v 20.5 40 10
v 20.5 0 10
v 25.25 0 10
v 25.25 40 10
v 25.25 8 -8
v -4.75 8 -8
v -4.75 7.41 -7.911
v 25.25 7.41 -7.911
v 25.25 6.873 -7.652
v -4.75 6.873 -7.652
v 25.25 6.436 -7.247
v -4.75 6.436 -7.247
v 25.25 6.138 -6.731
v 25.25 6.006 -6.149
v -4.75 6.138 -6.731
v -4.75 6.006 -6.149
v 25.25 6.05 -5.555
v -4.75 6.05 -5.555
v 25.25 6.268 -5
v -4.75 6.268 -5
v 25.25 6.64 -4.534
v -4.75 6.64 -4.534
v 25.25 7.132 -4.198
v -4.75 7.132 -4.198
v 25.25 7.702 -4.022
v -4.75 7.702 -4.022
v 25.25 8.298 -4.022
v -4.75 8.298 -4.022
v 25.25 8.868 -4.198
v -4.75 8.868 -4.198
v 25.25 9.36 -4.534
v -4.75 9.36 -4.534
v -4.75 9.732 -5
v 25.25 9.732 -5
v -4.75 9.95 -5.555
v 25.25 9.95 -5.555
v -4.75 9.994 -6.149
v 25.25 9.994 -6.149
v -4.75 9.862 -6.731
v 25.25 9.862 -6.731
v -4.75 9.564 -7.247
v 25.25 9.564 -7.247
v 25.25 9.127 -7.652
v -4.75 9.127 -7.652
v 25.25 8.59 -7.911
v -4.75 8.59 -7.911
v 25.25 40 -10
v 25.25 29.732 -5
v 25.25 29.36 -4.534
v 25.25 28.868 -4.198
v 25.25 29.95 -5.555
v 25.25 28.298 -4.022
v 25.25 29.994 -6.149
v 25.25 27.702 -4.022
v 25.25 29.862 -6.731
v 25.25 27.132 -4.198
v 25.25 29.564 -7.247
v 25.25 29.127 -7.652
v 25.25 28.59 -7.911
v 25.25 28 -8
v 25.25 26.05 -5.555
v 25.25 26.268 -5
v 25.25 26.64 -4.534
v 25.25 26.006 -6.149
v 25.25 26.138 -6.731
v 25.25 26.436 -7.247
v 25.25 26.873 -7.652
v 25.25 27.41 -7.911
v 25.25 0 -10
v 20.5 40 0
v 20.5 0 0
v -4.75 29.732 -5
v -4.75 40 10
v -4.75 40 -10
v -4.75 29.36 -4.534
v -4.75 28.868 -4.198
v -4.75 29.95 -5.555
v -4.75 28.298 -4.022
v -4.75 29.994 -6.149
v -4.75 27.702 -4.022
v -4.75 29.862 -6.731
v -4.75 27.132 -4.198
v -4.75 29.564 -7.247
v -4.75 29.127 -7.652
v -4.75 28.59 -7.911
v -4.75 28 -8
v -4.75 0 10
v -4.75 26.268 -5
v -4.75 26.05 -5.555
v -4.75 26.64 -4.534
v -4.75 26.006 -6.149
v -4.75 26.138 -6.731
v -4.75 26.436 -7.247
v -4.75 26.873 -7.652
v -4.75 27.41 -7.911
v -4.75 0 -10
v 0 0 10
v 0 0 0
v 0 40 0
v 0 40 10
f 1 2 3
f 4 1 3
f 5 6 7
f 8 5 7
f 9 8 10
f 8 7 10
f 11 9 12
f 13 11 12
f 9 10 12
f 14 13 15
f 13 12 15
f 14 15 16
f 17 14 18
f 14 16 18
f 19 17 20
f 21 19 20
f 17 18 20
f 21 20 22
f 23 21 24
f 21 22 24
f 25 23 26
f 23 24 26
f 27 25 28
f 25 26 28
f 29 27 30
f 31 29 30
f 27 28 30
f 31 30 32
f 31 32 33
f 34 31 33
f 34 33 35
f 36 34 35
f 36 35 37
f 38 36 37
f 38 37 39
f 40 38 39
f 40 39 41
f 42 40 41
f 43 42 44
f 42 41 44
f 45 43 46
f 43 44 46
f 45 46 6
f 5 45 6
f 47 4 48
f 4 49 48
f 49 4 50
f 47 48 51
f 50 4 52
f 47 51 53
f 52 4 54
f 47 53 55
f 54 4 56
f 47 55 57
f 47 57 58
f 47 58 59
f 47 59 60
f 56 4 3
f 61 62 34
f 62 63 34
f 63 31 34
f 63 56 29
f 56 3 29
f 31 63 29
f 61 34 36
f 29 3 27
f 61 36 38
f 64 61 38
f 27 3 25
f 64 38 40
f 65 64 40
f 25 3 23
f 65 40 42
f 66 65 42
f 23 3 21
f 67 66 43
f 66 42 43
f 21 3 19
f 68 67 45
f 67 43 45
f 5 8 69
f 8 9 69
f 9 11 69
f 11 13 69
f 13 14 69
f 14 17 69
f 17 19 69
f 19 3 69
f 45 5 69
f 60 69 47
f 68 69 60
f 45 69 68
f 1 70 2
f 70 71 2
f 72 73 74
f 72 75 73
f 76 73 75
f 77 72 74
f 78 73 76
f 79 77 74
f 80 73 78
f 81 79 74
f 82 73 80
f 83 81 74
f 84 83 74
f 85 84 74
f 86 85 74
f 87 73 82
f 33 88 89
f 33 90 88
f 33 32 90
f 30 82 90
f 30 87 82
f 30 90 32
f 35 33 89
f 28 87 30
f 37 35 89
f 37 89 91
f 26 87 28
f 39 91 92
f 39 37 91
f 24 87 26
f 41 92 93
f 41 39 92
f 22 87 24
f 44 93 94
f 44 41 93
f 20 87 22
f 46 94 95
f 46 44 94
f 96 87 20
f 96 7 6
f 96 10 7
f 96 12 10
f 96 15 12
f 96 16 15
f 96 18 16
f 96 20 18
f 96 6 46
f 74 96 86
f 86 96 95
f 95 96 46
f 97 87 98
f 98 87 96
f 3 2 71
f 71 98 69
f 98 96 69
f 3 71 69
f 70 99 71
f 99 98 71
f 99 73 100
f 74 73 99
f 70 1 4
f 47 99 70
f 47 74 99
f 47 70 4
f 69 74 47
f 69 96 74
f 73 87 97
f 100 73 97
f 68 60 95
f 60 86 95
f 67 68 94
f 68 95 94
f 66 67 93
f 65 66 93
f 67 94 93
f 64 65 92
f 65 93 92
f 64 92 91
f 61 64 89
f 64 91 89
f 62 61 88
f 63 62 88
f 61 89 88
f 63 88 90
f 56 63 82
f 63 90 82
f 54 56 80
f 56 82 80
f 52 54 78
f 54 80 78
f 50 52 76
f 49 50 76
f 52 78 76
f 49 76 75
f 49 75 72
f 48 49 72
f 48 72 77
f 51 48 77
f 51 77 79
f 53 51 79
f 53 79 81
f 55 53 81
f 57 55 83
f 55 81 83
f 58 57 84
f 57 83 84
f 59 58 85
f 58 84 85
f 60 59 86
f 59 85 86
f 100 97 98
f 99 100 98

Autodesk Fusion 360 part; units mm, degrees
sketch "Sketch1" plane through (0, 0, 0) normal (0, 1, 0) x (1, 0, 0)
  line L0 (0, 0) -> (20.5, 0)
  line L1 (20.5, 0) -> (20.5, -10)
  line L2 (20.5, -10) -> (0, -10)
  line L3 (0, -10) -> (0, 0)
  line L4 (25.25, 0) -> (-4.75, 0)
  line L5 (-4.75, 0) -> (-4.75, -10)
  line L6 (-4.75, -10) -> (25.25, -10)
  line L7 (25.25, -10) -> (25.25, 0)
  line L8 (25.25, 0) -> (-4.75, -10) construction
  line L9 (-4.75, 0) -> (25.25, -10) construction
  line L10 (-4.75, 0) -> (-4.75, 6)
  line L11 (-4.75, 6) -> (25.25, 6)
  line L12 (25.25, 0) -> (25.25, 6)
  line L13 (-4.75, 6) -> (-4.75, 10)
  line L14 (-4.75, 10) -> (25.25, 10)
  line L15 (25.25, 10) -> (25.25, 6)
  line L16 (10.25, 0) -> (10.25, 10) construction
  line L17 (10.25, 0) -> (10.25, 2) construction
  line L18 (10.25, 2) -> (17.25, 2) construction
  line L19 (17.25, 2) -> (10.25, 2) construction
  line L20 (10.25, 2) -> (3.25, 2) construction
  circle A0 centre (3.25, 4) radius 2
  circle A1 centre (17.25, 4) radius 2
  point P0 (10.25, -5)
  dimension "d1" = 20.5
  dimension "d2" = 10
  dimension "d3" = 30
  dimension "d4" = 10
  dimension "d5" = 6
  dimension "d6" = 2
  dimension "d7" = 7
  dimension "d8" = 7
  dimension "d9" = 4
extrude "Extrude1" add sketch "Sketch1" along normal blind 40 contours L0 L4 L10 L11 L12 | L3 L4 L5 L6 | L1 L4 L6 L7 | L11 L13 L14 L15
sketch "Boceto3" plane through (25.25, 0, 0) normal (1, 0, 0) x (0, 1, 0)
  line L0 (0, 10) -> (0, -10)
  line L1 (0, -10) -> (40, -10)
  line L2 (40, -10) -> (40, 10)
  line L3 (40, 10) -> (0, 10)
  line L4 (0, -10) -> (0, -6)
  circle A0 centre (28, -6) radius 2
  circle A1 centre (8, -6) radius 2
  dimension "d12" = 4
  dimension "d13" = 4
  dimension "d14" = 4
delete_face "SuprimirCaras1" 2 faces at (5.2476, 26.6667, -3.9019) (4.4101, 26.6667, -5.6292)
delete_face "SuprimirCaras2" 1 faces at (19.2401, 13.3333, -3.8009)
hole "Agujero1" at (25.25, 8, -6) at (25.25, 28, -6) direction (-1, 0, 0) diameter 4 depth 36 tip angle 180
